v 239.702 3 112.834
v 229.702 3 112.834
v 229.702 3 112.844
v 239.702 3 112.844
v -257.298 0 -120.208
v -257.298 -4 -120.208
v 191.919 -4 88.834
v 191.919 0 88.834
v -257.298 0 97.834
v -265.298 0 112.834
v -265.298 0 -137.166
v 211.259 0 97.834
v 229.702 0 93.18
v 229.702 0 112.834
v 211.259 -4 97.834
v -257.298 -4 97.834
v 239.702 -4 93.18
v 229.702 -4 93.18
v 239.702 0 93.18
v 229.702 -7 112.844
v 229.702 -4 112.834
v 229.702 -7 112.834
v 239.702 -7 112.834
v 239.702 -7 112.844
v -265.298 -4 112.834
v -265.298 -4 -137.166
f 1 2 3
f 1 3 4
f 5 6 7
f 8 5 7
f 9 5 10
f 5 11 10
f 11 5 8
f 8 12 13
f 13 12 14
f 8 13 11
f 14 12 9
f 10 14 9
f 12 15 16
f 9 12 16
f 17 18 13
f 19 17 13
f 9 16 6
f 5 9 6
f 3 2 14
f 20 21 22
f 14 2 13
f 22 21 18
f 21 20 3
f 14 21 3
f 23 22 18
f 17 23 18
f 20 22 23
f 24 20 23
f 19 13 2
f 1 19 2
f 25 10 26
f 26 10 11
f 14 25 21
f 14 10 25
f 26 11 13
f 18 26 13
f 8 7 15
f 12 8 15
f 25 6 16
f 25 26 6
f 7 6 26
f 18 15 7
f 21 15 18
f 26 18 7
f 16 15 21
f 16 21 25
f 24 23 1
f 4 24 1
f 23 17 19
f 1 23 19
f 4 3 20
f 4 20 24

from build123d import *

# Parameters (mm, degrees)
F1_DEPTH  = 4
F3_DEPTH  = 4
F4_W      = 10
F4_H      = 10
F5_DEPTH  = 24.7904
F7_DEPTH  = 10
F9_DEPTH  = 4
F4_H_2    = 3
F4_H_3    = 4
F11_DEPTH = 0.01


with BuildPart() as f1:
    # F0 (on Front) → F1 (new body)
    with BuildSketch(Plane.XZ):
        Polygon((239.7020892799, 112.8335457823), (-265.2979107201, 112.8335457823), (-265.2979107201, -137.1664542177), (239.7020892799, 97.8335457823), align=None)
    extrude(amount=F1_DEPTH)

    # F2 (on face) → F3 (cut)
    with BuildSketch(Plane.XZ.offset(4)):
        Polygon((211.2594902502, 97.8335457823), (189.459964633, 97.8335457823), (-257.2979107201, 97.8335457823), (-257.2979107201, -120.2080170455), (191.9194537148, 88.8337268004), align=None)
    extrude(amount=-F3_DEPTH, mode=Mode.SUBTRACT)

    # F4 (on face) → F5 (join)
    with BuildSketch(Plane.XY.offset(112.8335457823)):
        with Locations((234.7020892799, -2)):
            Rectangle(F4_W, F4_H)
    extrude(amount=-F5_DEPTH)

    # F6 (on face) → F7 (cut)
    with BuildSketch(Plane(origin=(229.7020892799, 0, 0), x_dir=(0, -1, 0), z_dir=(-1, 0, 0))):
        Polygon((7, 112.8335457823), (4, 93.1800804357), (0, 93.1800804357), (-3, 112.8335457823), (-3, 88.0431457823), (7, 88.0431457823), align=None)
    extrude(amount=-F7_DEPTH, mode=Mode.SUBTRACT)

    # F4 (on face) → F11 (join)
    with BuildSketch(Plane.XY.offset(112.8335457823)):
        with Locations((234.7020892799, 1.5)):
            Rectangle(F4_W, F4_H_2)
        with Locations((234.7020892799, -2)):
            Rectangle(F4_W, F4_H_3)
        with Locations((234.7020892799, -5.5)):
            Rectangle(F4_W, F4_H_2)
    extrude(amount=F11_DEPTH)


with BuildPart() as f9:
    # F8 (on face) → F9 (new body)
    with BuildSketch(Plane.XZ.offset(4)):
        Polygon((-265.2979107201, -137.1664542177), (241.7362299691, 93.1800804357), (229.7020892799, 93.1800804357), align=None)
    extrude(amount=-F9_DEPTH)


solid = f1.part
